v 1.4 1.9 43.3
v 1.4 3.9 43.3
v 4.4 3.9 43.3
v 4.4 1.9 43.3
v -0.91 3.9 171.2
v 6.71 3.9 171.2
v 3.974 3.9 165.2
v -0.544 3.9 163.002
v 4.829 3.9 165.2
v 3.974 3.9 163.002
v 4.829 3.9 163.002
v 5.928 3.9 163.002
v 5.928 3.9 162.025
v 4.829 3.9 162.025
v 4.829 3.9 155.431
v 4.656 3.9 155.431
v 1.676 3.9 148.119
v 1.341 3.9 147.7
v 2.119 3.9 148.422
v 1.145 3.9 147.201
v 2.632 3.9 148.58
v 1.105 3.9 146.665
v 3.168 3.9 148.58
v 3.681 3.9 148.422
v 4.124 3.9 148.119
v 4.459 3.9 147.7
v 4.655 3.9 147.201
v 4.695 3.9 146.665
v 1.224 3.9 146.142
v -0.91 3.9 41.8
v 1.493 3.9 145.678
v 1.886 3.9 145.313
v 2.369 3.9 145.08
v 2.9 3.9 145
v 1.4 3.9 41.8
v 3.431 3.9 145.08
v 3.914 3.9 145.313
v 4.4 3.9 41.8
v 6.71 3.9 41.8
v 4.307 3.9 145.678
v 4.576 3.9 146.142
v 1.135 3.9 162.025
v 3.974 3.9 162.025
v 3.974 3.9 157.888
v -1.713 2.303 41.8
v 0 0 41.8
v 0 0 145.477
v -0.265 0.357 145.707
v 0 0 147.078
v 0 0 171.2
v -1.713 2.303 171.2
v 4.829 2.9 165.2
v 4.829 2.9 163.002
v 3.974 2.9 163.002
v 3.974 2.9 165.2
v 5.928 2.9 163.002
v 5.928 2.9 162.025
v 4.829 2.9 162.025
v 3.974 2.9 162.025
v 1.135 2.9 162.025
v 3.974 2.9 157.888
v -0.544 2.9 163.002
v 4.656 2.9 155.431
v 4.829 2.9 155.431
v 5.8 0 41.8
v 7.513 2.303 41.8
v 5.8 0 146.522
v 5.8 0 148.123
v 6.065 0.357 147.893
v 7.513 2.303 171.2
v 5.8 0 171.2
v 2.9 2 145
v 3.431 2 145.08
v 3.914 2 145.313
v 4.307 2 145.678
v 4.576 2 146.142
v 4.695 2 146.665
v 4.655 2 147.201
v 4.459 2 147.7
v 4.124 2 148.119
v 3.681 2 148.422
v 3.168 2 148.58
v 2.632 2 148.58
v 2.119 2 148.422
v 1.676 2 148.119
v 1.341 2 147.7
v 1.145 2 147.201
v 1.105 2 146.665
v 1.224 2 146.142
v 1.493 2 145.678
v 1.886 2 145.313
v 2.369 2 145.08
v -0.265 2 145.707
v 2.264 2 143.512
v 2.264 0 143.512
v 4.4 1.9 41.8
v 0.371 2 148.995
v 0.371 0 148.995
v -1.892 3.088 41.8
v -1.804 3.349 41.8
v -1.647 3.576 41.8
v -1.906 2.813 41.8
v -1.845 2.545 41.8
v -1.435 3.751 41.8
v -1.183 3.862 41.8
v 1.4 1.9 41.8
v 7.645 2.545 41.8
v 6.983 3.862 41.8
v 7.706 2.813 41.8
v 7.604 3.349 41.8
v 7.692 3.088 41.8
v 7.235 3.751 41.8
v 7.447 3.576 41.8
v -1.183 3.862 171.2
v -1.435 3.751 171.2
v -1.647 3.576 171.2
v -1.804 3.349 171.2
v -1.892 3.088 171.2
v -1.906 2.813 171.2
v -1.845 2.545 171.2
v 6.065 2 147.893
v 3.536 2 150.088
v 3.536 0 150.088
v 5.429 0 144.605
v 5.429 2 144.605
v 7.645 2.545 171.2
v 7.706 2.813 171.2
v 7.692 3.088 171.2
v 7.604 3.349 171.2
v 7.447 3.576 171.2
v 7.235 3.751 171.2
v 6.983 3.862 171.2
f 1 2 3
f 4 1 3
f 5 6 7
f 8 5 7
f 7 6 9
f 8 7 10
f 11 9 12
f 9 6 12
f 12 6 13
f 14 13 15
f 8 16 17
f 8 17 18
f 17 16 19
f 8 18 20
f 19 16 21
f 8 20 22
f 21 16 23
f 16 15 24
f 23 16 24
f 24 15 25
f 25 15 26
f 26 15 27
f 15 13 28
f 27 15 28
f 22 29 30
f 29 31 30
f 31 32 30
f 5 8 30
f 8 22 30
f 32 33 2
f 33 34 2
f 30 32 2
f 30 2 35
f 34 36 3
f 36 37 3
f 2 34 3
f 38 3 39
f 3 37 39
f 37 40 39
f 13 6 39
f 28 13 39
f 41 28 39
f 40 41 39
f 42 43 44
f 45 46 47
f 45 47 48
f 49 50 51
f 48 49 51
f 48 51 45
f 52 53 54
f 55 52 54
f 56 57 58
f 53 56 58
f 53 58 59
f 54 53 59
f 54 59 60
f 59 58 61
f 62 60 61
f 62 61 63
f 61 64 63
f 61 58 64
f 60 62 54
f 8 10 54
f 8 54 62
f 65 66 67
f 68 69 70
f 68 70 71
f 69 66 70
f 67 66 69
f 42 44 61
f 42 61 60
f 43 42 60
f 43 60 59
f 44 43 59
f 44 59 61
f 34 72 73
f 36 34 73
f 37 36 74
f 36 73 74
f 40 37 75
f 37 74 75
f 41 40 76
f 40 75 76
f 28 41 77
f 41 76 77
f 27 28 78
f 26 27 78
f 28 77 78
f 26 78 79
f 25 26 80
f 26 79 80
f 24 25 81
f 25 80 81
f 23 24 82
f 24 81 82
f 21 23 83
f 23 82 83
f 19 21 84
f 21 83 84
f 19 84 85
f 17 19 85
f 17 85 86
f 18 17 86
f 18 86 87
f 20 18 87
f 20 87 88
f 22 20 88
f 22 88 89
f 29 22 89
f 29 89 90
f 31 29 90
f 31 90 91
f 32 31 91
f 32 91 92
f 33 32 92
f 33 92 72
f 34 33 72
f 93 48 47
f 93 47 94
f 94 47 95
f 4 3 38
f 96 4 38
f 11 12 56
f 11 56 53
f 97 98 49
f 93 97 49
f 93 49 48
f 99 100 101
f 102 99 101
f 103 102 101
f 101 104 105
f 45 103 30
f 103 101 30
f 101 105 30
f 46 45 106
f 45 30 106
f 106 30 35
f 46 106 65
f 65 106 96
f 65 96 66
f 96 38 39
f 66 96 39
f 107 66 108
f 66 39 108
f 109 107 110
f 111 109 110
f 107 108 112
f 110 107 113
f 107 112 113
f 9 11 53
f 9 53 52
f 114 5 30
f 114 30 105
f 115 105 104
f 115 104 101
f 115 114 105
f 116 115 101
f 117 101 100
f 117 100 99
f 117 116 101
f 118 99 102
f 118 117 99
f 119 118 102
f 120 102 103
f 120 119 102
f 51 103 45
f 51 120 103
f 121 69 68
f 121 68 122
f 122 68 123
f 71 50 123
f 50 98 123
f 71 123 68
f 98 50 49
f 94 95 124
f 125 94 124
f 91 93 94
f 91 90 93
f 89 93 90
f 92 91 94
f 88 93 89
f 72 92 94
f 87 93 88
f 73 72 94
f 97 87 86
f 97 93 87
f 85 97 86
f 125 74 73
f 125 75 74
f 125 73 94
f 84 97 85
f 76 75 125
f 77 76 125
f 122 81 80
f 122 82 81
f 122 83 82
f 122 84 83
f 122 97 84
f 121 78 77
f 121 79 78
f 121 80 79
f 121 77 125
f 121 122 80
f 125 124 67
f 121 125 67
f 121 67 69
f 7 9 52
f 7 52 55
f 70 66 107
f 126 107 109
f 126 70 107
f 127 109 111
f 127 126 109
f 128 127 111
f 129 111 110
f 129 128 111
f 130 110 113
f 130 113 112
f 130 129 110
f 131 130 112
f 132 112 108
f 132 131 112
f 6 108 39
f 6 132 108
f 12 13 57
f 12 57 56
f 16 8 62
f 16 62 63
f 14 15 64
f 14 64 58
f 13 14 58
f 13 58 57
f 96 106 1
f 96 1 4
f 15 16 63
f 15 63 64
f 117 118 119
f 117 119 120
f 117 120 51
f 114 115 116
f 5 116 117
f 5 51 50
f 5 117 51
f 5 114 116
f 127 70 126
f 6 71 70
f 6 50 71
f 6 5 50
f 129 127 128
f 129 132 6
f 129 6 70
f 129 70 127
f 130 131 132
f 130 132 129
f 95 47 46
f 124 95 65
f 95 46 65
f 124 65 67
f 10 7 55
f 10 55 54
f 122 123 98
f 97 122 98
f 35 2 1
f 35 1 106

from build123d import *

# Parameters (mm, degrees)
BOSS_EXTRUDE1_DEPTH = 171.2
FILLET1_R           = 1
SKETCH2_R           = 1.8
CUT_EXTRUDE1_DEPTH  = 200
CUT_EXTRUDE2_DEPTH  = 2
LPATTERN1_COUNT     = 3
LPATTERN1_PITCH     = 116
CUT_EXTRUDE3_DEPTH  = 1
THICKEN1_T1         = 40
SKETCH5_W           = 43.187551832
SKETCH5_H           = 200
CUT_EXTRUDE4_DEPTH  = 10
SKETCH7_W           = 3
SKETCH7_H           = 3
CUT_EXTRUDE5_DEPTH  = 2


with BuildPart() as part:
    # Sketch1 → Boss-Extrude1 (new body)
    with BuildSketch(Plane.XY):
        Polygon((0, 0), (5.8, 0), (8.7, 3.9), (-2.9, 3.9), align=None)
    extrude(amount=BOSS_EXTRUDE1_DEPTH)

    # Fillet1
    fillet1_edges = [part.edges().sort_by_distance(p)[0] for p in [
        (-2.9, 3.9, 85.6),
        (8.7, 3.9, 85.6),
    ]]
    fillet(fillet1_edges, radius=FILLET1_R)

    # Sketch2 → Cut-Extrude1 (cut)
    with BuildSketch(Plane.XZ):
        with Locations(Location((2.9, 146.8, 0), (0, 0, 270))):
            Circle(SKETCH2_R)
    cut_extrude1 = extrude(amount=-CUT_EXTRUDE1_DEPTH, mode=Mode.SUBTRACT)

    # Sketch3 → Cut-Extrude2 (cut)
    with BuildSketch(Plane.XZ):
        Polygon((3.536306697, 150.087620282), (0.370990666, 148.994867905), (-0.265316031, 145.707247623), (2.263693303, 143.512379718), (5.429009334, 144.605132095), (6.065316031, 147.892752377), align=None)
    cut_extrude2 = extrude(amount=-CUT_EXTRUDE2_DEPTH, mode=Mode.SUBTRACT)

    # LPattern1: Cut-Extrude1, Cut-Extrude2 ×3
    with Locations(*[(0, 0, -i * LPATTERN1_PITCH) for i in range(1, LPATTERN1_COUNT)]):
        add(cut_extrude1, mode=Mode.SUBTRACT)
        add(cut_extrude2, mode=Mode.SUBTRACT)

    # Sketch4 → Cut-Extrude3 (cut)
    with BuildSketch(Plane(origin=(0, 3.9, 0), x_dir=(1, 0, 0), z_dir=(0, 1, 0))):
        Polygon((4.655544406, -155.430769231), (4.829177218, -155.430769231), (4.829177218, -162.025), (5.92821568, -162.025), (5.92821568, -163.001923077), (4.829177218, -163.001923077), (4.829177218, -165.2), (3.974369526, -165.2), (3.974369526, -163.001923077), (-0.543899705, -163.001923077), align=None)
        Polygon((3.974369526, -162.025), (3.974369526, -157.888341346), (1.135186834, -162.025), align=None, mode=Mode.SUBTRACT)
    extrude(amount=-CUT_EXTRUDE3_DEPTH, mode=Mode.SUBTRACT)

    # Surface-Offset1: a surface, a copy of 1 face of the part
    surface_offset1_1 = part.part.faces().sort_by_distance((2.9, 2.093393293, 0))[0]
    add(Solid.thicken(surface_offset1_1, THICKEN1_T1))

    # Sketch5 → Cut-Extrude4 (cut)
    with BuildSketch(Plane(origin=(0, 3.9, 0), x_dir=(1, 0, 0), z_dir=(0, 1, 0))):
        with Locations((8.67861609, 58.2)):
            Rectangle(SKETCH5_W, SKETCH5_H)
    extrude(amount=-CUT_EXTRUDE4_DEPTH, mode=Mode.SUBTRACT)

    # Sketch7 → Cut-Extrude5 (cut)
    with BuildSketch(Plane(origin=(0, 3.9, 0), x_dir=(1, 0, 0), z_dir=(0, 1, 0))):
        with Locations((2.9, -41.8)):
            Rectangle(SKETCH7_W, SKETCH7_H)
    extrude(amount=-CUT_EXTRUDE5_DEPTH, mode=Mode.SUBTRACT)


solid = part.part
